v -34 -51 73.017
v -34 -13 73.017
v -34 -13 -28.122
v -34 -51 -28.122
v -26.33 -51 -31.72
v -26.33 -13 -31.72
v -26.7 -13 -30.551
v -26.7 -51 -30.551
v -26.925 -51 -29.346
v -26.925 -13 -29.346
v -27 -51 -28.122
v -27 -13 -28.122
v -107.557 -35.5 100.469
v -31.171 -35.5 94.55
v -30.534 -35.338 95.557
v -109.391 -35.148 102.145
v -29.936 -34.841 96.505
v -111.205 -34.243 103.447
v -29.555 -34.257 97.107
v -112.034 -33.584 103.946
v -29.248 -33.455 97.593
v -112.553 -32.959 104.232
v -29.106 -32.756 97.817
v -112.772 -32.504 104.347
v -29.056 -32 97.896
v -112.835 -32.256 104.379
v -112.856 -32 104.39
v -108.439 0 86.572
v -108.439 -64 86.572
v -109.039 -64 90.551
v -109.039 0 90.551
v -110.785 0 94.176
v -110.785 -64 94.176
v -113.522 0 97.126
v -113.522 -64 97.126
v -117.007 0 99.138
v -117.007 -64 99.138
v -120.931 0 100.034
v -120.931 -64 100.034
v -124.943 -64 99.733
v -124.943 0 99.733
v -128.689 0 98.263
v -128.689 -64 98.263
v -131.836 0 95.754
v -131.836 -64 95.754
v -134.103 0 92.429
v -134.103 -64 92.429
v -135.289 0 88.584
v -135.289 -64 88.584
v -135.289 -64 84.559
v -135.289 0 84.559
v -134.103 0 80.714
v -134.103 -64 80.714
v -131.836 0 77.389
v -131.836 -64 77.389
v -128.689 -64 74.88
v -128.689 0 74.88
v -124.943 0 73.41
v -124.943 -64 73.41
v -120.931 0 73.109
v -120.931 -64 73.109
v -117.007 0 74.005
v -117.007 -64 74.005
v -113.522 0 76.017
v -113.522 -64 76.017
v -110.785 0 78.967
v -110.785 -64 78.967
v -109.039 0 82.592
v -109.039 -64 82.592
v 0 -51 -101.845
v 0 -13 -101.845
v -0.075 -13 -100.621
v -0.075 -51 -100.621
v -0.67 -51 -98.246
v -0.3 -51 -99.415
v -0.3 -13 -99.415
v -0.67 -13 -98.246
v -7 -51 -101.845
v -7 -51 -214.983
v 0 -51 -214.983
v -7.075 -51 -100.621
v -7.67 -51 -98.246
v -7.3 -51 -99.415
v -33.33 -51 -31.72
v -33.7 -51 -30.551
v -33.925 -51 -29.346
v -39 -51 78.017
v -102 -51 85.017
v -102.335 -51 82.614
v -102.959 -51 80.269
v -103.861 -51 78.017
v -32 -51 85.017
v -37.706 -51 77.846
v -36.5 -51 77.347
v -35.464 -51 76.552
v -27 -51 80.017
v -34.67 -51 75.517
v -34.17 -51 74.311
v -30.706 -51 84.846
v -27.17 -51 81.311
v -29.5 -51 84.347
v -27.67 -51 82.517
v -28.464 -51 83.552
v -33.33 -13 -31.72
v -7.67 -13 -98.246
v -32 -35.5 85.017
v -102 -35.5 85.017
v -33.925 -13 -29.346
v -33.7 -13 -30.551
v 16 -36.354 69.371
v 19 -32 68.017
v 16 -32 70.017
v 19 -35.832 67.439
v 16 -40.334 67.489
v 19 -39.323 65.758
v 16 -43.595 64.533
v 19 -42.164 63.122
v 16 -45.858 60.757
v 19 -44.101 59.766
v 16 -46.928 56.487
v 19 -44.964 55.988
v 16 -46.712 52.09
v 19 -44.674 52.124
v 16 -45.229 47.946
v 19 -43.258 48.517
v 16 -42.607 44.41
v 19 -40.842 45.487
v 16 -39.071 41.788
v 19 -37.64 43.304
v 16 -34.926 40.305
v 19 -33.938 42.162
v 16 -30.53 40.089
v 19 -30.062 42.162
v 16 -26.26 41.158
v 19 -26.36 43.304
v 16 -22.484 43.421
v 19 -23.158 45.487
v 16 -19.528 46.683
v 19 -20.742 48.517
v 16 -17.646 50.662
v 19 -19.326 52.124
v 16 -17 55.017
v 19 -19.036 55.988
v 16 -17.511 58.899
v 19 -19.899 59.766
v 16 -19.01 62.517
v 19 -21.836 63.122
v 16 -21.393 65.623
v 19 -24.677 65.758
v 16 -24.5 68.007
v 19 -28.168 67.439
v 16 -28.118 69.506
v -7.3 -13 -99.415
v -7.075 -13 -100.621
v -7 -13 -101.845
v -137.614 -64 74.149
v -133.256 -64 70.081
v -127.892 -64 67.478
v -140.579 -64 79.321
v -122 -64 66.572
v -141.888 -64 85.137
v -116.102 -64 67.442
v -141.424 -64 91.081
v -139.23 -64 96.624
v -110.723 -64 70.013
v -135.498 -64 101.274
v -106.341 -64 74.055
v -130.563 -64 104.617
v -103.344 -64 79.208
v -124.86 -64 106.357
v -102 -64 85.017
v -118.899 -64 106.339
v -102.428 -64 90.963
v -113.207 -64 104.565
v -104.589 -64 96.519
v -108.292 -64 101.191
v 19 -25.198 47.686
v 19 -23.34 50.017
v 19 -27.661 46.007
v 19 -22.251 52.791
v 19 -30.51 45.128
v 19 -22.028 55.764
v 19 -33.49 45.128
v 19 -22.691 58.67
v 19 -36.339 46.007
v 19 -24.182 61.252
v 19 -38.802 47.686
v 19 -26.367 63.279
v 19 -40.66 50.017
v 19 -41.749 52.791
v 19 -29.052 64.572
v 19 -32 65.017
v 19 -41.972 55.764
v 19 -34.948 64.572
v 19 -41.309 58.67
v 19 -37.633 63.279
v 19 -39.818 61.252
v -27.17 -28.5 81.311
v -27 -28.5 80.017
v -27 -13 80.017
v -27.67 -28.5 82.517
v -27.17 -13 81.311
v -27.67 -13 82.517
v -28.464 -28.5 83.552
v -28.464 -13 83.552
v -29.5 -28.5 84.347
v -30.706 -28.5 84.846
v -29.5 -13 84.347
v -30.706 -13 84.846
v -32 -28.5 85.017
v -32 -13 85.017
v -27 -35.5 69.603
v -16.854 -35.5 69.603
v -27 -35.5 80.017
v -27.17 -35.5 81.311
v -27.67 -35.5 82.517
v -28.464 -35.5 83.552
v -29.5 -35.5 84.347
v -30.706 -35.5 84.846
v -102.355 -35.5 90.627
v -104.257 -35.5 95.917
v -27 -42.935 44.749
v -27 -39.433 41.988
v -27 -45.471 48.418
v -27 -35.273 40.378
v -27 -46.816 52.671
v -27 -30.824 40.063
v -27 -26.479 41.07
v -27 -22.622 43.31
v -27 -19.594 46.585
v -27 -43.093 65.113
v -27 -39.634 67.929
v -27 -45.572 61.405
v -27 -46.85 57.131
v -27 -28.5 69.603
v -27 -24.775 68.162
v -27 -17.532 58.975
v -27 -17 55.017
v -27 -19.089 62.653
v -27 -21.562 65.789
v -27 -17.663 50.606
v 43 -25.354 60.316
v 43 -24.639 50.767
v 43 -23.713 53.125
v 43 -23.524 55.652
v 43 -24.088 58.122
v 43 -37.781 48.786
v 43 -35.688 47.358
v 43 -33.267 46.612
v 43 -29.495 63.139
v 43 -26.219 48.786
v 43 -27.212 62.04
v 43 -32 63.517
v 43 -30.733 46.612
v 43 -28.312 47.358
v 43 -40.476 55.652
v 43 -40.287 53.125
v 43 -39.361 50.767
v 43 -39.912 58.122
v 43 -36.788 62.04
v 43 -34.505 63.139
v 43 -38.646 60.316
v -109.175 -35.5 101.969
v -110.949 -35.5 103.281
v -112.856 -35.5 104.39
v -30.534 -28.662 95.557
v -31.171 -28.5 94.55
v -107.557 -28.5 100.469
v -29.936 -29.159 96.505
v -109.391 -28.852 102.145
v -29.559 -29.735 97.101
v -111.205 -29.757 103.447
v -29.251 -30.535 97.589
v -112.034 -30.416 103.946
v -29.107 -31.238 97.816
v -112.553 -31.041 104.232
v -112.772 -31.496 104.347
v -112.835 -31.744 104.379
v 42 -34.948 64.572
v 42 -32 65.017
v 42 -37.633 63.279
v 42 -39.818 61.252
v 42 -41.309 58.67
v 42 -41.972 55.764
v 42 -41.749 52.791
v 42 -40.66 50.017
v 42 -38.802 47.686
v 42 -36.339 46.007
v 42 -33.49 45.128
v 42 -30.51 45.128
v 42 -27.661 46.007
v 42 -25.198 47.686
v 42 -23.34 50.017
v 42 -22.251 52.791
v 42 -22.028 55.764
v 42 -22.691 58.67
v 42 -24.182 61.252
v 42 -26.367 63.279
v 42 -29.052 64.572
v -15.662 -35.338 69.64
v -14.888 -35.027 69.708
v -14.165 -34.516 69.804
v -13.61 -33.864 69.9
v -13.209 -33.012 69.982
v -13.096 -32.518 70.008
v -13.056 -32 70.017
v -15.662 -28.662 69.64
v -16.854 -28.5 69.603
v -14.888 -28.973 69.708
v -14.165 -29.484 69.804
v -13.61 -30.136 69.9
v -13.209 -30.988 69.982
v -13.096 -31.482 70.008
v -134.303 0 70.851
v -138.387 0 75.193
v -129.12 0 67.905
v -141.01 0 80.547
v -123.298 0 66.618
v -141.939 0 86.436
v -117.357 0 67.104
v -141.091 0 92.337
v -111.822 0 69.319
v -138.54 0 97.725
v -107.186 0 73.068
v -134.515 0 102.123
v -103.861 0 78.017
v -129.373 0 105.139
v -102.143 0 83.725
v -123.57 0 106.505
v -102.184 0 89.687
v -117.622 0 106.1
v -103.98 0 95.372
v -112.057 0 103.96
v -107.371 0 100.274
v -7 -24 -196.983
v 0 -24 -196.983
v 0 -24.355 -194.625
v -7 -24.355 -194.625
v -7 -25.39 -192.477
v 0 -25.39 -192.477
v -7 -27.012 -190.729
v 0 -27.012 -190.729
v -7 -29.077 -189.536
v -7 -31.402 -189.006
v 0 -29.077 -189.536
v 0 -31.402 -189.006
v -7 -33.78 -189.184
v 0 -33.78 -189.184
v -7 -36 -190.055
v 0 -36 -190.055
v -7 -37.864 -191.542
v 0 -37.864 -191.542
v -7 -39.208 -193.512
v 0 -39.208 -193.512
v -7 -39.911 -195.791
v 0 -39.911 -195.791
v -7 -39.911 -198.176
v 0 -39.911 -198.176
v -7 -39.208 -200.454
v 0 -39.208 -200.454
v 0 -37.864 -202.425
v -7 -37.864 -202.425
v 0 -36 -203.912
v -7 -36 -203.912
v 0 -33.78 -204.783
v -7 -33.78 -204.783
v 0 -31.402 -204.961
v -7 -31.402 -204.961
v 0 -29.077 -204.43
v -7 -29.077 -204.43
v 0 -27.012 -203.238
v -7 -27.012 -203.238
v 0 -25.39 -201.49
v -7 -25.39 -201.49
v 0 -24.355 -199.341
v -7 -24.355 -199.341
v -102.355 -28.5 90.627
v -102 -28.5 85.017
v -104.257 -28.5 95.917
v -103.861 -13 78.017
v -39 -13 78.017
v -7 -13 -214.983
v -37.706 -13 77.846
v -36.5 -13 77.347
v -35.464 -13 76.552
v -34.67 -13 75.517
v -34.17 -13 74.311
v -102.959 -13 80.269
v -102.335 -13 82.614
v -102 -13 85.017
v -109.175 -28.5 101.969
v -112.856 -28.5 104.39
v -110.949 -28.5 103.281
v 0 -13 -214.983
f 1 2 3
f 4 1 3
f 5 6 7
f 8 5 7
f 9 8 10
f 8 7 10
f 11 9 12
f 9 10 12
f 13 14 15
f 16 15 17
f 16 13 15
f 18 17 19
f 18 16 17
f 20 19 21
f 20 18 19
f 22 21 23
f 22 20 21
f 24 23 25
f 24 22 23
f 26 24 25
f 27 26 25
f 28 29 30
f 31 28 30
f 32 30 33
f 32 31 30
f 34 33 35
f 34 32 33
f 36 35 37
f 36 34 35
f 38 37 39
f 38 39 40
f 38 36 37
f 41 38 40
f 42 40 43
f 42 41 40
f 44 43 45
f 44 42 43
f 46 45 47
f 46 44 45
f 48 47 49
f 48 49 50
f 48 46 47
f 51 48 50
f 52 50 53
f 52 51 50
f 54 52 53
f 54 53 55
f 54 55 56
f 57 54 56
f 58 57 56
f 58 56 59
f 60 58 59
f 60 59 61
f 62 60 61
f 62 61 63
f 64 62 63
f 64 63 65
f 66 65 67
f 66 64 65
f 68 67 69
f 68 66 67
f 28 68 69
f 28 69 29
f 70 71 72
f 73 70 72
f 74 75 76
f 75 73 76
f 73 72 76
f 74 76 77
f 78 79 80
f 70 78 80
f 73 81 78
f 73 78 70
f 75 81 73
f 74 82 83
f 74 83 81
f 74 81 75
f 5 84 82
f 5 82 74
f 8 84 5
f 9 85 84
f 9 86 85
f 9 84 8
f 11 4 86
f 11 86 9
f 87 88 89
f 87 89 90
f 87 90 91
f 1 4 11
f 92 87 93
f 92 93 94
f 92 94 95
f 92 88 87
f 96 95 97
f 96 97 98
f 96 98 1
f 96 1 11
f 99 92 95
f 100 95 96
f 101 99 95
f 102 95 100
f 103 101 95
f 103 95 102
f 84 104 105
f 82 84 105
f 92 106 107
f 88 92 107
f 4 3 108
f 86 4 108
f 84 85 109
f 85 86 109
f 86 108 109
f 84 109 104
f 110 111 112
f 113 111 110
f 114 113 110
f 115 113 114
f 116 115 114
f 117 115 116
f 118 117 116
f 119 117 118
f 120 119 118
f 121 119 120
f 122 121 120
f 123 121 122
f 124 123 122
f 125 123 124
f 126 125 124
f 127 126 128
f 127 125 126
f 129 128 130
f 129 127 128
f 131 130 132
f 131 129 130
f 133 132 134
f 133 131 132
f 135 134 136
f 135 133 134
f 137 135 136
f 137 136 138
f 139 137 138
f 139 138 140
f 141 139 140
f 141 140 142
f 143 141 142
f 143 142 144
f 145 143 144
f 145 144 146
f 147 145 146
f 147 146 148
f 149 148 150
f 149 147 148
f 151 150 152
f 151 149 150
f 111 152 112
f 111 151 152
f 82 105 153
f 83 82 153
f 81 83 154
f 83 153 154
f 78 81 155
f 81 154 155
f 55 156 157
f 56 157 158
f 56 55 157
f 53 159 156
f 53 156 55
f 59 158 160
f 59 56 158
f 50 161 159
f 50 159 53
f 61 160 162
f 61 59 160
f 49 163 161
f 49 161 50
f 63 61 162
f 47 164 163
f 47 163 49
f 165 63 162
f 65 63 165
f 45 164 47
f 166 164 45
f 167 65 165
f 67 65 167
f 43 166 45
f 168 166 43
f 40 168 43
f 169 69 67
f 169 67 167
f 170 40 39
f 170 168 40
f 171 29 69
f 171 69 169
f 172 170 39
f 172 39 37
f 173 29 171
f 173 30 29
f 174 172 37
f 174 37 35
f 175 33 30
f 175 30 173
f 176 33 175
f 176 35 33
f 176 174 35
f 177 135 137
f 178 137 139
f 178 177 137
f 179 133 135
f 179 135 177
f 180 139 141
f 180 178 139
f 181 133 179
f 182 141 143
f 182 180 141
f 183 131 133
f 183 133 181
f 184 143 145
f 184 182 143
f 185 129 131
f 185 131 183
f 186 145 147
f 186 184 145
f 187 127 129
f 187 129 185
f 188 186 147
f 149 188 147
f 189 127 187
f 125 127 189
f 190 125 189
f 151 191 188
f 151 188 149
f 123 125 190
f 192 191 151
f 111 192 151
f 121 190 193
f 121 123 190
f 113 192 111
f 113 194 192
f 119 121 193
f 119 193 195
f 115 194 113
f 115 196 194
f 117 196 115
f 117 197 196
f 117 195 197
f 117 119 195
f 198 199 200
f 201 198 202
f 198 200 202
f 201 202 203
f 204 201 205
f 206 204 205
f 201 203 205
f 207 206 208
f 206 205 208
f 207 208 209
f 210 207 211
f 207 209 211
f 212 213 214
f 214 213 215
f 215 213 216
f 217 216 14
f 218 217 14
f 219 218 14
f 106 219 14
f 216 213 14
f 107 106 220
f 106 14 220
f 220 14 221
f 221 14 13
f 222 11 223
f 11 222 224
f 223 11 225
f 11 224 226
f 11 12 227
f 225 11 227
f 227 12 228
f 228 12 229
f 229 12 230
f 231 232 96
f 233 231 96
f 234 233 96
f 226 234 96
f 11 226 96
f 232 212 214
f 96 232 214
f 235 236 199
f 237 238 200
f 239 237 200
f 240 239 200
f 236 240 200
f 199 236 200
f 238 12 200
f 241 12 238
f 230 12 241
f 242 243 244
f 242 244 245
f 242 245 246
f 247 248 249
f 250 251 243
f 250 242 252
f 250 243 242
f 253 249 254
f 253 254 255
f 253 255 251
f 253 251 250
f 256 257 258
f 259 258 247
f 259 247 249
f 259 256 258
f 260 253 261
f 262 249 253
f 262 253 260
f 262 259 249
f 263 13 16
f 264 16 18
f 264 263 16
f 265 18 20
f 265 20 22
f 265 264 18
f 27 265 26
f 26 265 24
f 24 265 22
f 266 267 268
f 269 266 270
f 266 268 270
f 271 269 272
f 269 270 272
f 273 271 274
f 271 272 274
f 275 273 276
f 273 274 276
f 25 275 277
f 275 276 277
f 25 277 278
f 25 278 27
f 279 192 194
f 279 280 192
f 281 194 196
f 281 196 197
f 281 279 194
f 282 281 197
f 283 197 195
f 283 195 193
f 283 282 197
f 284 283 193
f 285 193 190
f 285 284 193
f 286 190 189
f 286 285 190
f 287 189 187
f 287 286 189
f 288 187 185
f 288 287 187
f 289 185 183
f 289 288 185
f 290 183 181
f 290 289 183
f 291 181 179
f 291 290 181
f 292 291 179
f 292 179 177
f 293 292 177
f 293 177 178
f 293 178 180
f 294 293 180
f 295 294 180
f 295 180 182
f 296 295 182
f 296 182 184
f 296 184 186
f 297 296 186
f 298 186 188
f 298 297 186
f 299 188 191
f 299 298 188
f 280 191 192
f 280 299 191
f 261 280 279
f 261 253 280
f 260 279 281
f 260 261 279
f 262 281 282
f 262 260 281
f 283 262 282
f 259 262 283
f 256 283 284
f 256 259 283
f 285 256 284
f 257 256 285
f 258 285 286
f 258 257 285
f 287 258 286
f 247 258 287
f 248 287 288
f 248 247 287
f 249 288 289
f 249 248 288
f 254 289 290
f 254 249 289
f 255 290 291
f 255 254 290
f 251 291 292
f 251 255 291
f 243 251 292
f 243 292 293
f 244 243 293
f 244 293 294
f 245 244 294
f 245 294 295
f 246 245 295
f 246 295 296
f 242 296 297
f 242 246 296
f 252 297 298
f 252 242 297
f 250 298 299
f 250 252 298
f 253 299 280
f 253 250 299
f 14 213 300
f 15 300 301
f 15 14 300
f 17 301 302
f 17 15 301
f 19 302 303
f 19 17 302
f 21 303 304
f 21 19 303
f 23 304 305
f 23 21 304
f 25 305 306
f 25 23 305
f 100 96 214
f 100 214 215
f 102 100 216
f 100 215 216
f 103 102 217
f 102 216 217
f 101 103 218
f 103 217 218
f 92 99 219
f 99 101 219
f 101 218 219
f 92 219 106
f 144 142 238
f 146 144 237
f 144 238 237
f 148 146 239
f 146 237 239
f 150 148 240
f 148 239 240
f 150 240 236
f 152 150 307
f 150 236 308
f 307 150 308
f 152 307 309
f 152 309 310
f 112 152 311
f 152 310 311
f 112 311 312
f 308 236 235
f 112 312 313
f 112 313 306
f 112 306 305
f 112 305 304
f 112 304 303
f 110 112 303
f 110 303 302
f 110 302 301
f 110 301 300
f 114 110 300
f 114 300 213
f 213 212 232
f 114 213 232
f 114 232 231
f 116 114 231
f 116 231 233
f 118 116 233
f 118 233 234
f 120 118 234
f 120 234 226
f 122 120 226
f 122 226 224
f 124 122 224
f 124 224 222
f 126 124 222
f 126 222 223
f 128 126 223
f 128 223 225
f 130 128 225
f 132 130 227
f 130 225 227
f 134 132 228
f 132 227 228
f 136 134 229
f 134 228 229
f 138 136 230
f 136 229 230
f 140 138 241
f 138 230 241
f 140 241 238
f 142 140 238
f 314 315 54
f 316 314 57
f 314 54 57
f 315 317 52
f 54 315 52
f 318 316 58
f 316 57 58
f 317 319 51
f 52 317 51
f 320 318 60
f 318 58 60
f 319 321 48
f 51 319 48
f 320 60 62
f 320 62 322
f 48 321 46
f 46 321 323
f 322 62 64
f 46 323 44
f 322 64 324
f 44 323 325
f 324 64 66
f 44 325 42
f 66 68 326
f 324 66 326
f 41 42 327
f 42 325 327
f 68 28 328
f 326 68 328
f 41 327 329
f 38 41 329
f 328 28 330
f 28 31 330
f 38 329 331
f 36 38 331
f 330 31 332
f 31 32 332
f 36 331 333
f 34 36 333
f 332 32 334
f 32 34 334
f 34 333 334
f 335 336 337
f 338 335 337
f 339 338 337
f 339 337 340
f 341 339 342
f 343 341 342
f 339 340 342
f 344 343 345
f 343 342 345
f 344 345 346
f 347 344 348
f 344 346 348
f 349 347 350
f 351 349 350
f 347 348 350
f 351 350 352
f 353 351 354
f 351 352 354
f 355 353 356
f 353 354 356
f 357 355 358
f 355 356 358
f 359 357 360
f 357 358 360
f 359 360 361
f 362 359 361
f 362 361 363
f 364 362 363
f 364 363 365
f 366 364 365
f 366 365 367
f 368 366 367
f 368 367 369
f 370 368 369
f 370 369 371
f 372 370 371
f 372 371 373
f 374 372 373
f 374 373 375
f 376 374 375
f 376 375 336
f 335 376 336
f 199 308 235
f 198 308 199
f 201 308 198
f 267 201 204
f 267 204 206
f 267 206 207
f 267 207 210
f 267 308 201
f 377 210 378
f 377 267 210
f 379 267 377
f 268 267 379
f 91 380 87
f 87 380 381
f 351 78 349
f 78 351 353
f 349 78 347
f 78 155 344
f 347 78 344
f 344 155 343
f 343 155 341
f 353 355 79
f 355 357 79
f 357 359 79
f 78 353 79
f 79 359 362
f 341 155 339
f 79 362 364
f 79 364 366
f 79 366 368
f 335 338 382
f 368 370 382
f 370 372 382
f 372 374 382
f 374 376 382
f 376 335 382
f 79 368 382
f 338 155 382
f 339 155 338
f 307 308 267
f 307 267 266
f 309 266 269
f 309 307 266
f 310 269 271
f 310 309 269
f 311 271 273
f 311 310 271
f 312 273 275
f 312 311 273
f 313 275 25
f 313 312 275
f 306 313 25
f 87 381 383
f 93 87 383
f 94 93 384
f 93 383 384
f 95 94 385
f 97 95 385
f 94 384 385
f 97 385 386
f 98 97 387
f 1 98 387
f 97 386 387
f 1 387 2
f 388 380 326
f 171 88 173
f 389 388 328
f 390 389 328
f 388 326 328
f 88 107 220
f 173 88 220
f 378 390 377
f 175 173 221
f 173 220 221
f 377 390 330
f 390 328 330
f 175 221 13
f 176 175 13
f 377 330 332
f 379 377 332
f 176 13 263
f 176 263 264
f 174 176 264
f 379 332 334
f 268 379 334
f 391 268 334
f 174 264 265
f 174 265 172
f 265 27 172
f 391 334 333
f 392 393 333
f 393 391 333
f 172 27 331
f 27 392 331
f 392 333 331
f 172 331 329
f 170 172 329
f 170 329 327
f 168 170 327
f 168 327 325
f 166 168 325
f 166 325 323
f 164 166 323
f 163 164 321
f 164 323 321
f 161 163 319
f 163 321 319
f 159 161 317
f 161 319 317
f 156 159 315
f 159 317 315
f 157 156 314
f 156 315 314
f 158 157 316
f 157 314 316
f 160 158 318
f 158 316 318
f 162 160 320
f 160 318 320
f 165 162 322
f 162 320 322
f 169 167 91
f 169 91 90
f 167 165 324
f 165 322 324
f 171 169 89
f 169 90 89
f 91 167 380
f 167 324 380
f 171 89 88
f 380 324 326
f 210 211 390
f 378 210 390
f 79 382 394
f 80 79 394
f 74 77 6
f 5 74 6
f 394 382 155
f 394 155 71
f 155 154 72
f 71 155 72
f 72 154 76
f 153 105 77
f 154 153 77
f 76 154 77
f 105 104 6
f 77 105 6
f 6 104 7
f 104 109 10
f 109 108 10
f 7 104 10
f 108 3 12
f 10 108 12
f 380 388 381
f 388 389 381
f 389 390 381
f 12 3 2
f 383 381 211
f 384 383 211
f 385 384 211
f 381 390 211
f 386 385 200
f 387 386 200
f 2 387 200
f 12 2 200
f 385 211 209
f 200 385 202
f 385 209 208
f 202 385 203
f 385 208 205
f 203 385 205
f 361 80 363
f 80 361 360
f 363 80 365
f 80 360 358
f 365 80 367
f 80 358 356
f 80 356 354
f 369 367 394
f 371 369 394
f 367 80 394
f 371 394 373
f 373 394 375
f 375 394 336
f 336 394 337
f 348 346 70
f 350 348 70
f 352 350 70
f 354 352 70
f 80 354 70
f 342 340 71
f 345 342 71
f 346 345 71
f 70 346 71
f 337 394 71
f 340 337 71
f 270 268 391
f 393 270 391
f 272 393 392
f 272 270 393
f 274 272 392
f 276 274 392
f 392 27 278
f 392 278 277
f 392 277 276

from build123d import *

# Parameters (mm, degrees)
F0_R           = 13.5
F1_DEPTH       = 64
F2_W           = 102
F2_H           = 13
F3_DEPTH       = 400
F5_DEPTH       = 13
F7_DEPTH       = 13
F8_R           = 15
F9_DEPTH       = 43
F14_DEPTH      = 3.5
F14_DEPTH_BACK = 3.5
F15_R          = 8
F16_DEPTH      = 25
F17_T4_DEPTH   = 101.551131953
F17_S5_R       = 20
F17_T6_DEPTH   = 53
F17_T10_DEPTH  = 101.551131953
F17_S11_R      = 20
F17_T12_DEPTH  = 53
F17_T16_DEPTH  = 50.1219672703
F17_S17_R      = 15
F17_T18_DEPTH  = 28
F17_T22_DEPTH  = 50.1219672703
F17_S23_R      = 15
F17_T24_DEPTH  = 28


# Not quite as in the source:
# - a fillet or chamfer that OpenCascade refuses, or shapes differently, is made with other operations: its cross-section is extruded or revolved along the edge and cut away or added


with BuildPart() as f1:
    # F0 (on Front) → F1 (new body)
    with BuildSketch(Plane.XZ):
        with BuildLine():
            Line((-7, -214.9833835959), (0, -214.9833835959))
            Line((0, -214.9833835959), (0, -101.8451102358))
            ThreePointArc((0, -101.8451102358), (-0.1689225963, -100.0148323657), (-0.6699834164, -98.2463895535))
            Line((-0.6699834164, -98.2463895535), (-26.3300165836, -31.7203776383))
            ThreePointArc((-26.3300165836, -31.7203776383), (-26.8310774037, -29.9519348262), (-27, -28.1216569561))
            Line((-27, -28.1216569561), (-27, 80.0166164041))
            ThreePointArc((-27, 80.0166164041), (-28.4644660941, 83.55215031), (-32, 85.0166164041))
            Line((-32, 85.0166164041), (-102, 85.0166164041))
            ThreePointArc((-102, 85.0166164041), (-141.2677104995, 91.7114873793), (-103.8614958525, 78.0166164041))
            Line((-103.8614958525, 78.0166164041), (-39, 78.0166164041))
            ThreePointArc((-39, 78.0166164041), (-35.4644660941, 76.55215031), (-34, 73.0166164041))
            Line((-34, 73.0166164041), (-34, -28.1216569561))
            ThreePointArc((-34, -28.1216569561), (-33.8310774037, -29.9519348262), (-33.3300165836, -31.7203776383))
            Line((-33.3300165836, -31.7203776383), (-7.6699834164, -98.2463895535))
            ThreePointArc((-7.6699834164, -98.2463895535), (-7.1689225963, -100.0148323657), (-7, -101.8451102358))
            Line((-7, -101.8451102358), (-7, -214.9833835959))
        make_face()
        with Locations((-121.9394617303, 86.5715652479)):
            Circle(F0_R, mode=Mode.SUBTRACT)
    extrude(amount=F1_DEPTH)

    # F2 (on face) → F3 (cut)
    with BuildSketch(Plane.XY.offset(85.0166164041)):
        with Locations((-51, -6.5)):
            Rectangle(F2_W, F2_H)
        with Locations((-51, -57.5)):
            Rectangle(F2_W, F2_H)
    extrude(amount=-F3_DEPTH, mode=Mode.SUBTRACT)

    # F4 (on face) → F5 (cut)
    with BuildSketch(Plane(origin=(0, 0, 0), x_dir=(-1, 0, 0), z_dir=(0, 1, 0))):
        with BuildLine():
            ThreePointArc((103.8614958525, 78.0166164041), (102.6112129611, 81.4316431166), (102, 85.0166164041))
            Line((102, 85.0166164041), (102, 78.0166164041))
            Line((102, 78.0166164041), (103.8614958525, 78.0166164041))
        make_face()
    extrude(amount=-F5_DEPTH, mode=Mode.SUBTRACT)

    # F6 (on face) → F7 (cut)
    with BuildSketch(Plane.XZ.offset(64)):
        with BuildLine():
            Line((-102, 78.0166164041), (-102, 85.0166164041))
            ThreePointArc((-102, 85.0166164041), (-102.6112129611, 81.4316431166), (-103.8614958525, 78.0166164041))
            Line((-103.8614958525, 78.0166164041), (-102, 78.0166164041))
        make_face()
    extrude(amount=-F7_DEPTH, mode=Mode.SUBTRACT)

    # F8 (on face) → F9 (join)
    with BuildSketch(Plane.YZ.offset(-27)):
        with Locations((-32, 55.0166164041)):
            Circle(F8_R)
    extrude(amount=F9_DEPTH)

    # F11 (on face) → F12 (revolve)
    with BuildSketch(Plane(origin=(0, -32, 0), x_dir=(-1, 0, 0), z_dir=(0, 1, 0))):
        Polygon((-16, 55.0166164041), (-16, 70.0166164041), (-19, 68.0166164041), (-19, 65.0166164041), (-42, 65.0166164041), (-43, 63.5166164041), (-43, 55.0166164041), align=None)
    revolve(axis=Axis((29.5, -32, 55.0166164041), (1, 0, 0)))

    # F13 (on face) → F14 (join, two sides)
    with BuildSketch(Plane(origin=(0, -32, 0), x_dir=(-1, 0, 0), z_dir=(0, 1, 0))) as f14_sk:
        with BuildLine():
            ThreePointArc((102.0563293248, 85.0166164041), (104.6045567862, 96.385687049), (113.0563293248, 104.4054608288))
            Line((113.0563293248, 104.4054608288), (29.0563293248, 97.8962504797))
            Line((29.0563293248, 97.8962504797), (13.0563293248, 70.0166164041))
            Line((13.0563293248, 70.0166164041), (10.7852649025, 66.0593385881))
            Line((10.7852649025, 66.0593385881), (27, 66.0593385881))
            Line((27, 66.0593385881), (27, 70.0166164041))
            Line((27, 70.0166164041), (27, 80.0166164041))
            ThreePointArc((27, 80.0166164041), (28.4644660941, 83.55215031), (32, 85.0166164041))
            Line((32, 85.0166164041), (102.0563293248, 85.0166164041))
        make_face()
    extrude(amount=F14_DEPTH)
    extrude(f14_sk.sketch, amount=-F14_DEPTH_BACK)

    # F15 (on face) → F16 (cut)
    with BuildSketch(Plane.YZ):
        with Locations((-32, -196.9833835959)):
            Circle(F15_R)
    extrude(amount=-F16_DEPTH, mode=Mode.SUBTRACT)

    # F17: fillet of radius 3.5 on 4 edges, made by hand


with BuildPart() as f17_tool2:
    # F17_s3 → F17_t4 (new body)
    with BuildSketch(Plane(origin=(-128.9474066936, 0, 9.992211835), x_dir=(0, 1, 0), z_dir=(0.9970110578, 0, -0.0772589845))):
        with BuildLine():
            ThreePointArc((-35.5, 91.8587817466), (-34.4748737342, 94.3336554808), (-32, 95.3587817466))
            Line((-32, 95.3587817466), (-35.5, 95.3587817466))
            Line((-35.5, 95.3587817466), (-35.5, 91.8587817466))
        make_face()
    extrude(amount=F17_T4_DEPTH)

    # F17_s5 → F17_t6 (cut, symmetric)
    with BuildSketch(Plane.XZ.offset(33.8)):
        with Locations((-121.9394617303, 86.5715652479)):
            Circle(F17_S5_R)
    extrude(amount=F17_T6_DEPTH, both=True, mode=Mode.SUBTRACT)


with BuildPart() as f1_1:
    add(f1.part)

    # F17_t1: cut F17_tool2
    add(f17_tool2.part, mode=Mode.SUBTRACT)


with BuildPart() as f17_tool8:
    # F17_s9 → F17_t10 (new body)
    with BuildSketch(Plane(origin=(-128.9474066936, 0, 9.992211835), x_dir=(0, 1, 0), z_dir=(0.9970110578, 0, -0.0772589845))):
        with BuildLine():
            ThreePointArc((-28.5, 91.8587817466), (-29.5251262658, 94.3336554808), (-32, 95.3587817466))
            Line((-32, 95.3587817466), (-28.5, 95.3587817466))
            Line((-28.5, 95.3587817466), (-28.5, 91.8587817466))
        make_face()
    extrude(amount=F17_T10_DEPTH)

    # F17_s11 → F17_t12 (cut, symmetric)
    with BuildSketch(Plane.XZ.offset(30.2)):
        with Locations((-121.9394617303, 86.5715652479)):
            Circle(F17_S11_R)
    extrude(amount=F17_T12_DEPTH, both=True, mode=Mode.SUBTRACT)


with BuildPart() as f1_2:
    add(f1_1.part)

    # F17_t7: cut F17_tool8
    add(f17_tool8.part, mode=Mode.SUBTRACT)


with BuildPart() as f17_tool14:
    # F17_s15 → F17_t16 (new body)
    with BuildSketch(Plane(origin=(-53.8169429454, 0, 93.7747922742), x_dir=(0, 1, 0), z_dir=(0.4977511049, 0, -0.8673199165))):
        with BuildLine():
            ThreePointArc((-35.5, 20.026833714), (-34.4748737342, 22.5017074481), (-32, 23.526833714))
            Line((-32, 23.526833714), (-35.5, 23.526833714))
            Line((-35.5, 23.526833714), (-35.5, 20.026833714))
        make_face()
    extrude(amount=F17_T16_DEPTH)

    # F17_s17 → F17_t18 (cut, symmetric)
    with BuildSketch(Plane.YZ.offset(-22.5)):
        with Locations((-32, 55.0166164041)):
            Circle(F17_S17_R)
    extrude(amount=F17_T18_DEPTH, both=True, mode=Mode.SUBTRACT)


with BuildPart() as f1_3:
    add(f1_2.part)

    # F17_t13: cut F17_tool14
    add(f17_tool14.part, mode=Mode.SUBTRACT)


with BuildPart() as f17_tool20:
    # F17_s21 → F17_t22 (new body)
    with BuildSketch(Plane(origin=(-28.8686783585, 0, 50.3030118051), x_dir=(0, 1, 0), z_dir=(-0.4977511049, 0, 0.8673199165))):
        with BuildLine():
            ThreePointArc((-28.5, -20.026833714), (-29.5251262658, -22.5017074481), (-32, -23.526833714))
            Line((-32, -23.526833714), (-28.5, -23.526833714))
            Line((-28.5, -23.526833714), (-28.5, -20.026833714))
        make_face()
    extrude(amount=F17_T22_DEPTH)

    # F17_s23 → F17_t24 (cut, symmetric)
    with BuildSketch(Plane.YZ.offset(-22.5)):
        with Locations((-32, 55.0166164041)):
            Circle(F17_S23_R)
    extrude(amount=F17_T24_DEPTH, both=True, mode=Mode.SUBTRACT)


with BuildPart() as f1_4:
    add(f1_3.part)

    # F17_t19: cut F17_tool20
    add(f17_tool20.part, mode=Mode.SUBTRACT)


solid = f1_4.part
